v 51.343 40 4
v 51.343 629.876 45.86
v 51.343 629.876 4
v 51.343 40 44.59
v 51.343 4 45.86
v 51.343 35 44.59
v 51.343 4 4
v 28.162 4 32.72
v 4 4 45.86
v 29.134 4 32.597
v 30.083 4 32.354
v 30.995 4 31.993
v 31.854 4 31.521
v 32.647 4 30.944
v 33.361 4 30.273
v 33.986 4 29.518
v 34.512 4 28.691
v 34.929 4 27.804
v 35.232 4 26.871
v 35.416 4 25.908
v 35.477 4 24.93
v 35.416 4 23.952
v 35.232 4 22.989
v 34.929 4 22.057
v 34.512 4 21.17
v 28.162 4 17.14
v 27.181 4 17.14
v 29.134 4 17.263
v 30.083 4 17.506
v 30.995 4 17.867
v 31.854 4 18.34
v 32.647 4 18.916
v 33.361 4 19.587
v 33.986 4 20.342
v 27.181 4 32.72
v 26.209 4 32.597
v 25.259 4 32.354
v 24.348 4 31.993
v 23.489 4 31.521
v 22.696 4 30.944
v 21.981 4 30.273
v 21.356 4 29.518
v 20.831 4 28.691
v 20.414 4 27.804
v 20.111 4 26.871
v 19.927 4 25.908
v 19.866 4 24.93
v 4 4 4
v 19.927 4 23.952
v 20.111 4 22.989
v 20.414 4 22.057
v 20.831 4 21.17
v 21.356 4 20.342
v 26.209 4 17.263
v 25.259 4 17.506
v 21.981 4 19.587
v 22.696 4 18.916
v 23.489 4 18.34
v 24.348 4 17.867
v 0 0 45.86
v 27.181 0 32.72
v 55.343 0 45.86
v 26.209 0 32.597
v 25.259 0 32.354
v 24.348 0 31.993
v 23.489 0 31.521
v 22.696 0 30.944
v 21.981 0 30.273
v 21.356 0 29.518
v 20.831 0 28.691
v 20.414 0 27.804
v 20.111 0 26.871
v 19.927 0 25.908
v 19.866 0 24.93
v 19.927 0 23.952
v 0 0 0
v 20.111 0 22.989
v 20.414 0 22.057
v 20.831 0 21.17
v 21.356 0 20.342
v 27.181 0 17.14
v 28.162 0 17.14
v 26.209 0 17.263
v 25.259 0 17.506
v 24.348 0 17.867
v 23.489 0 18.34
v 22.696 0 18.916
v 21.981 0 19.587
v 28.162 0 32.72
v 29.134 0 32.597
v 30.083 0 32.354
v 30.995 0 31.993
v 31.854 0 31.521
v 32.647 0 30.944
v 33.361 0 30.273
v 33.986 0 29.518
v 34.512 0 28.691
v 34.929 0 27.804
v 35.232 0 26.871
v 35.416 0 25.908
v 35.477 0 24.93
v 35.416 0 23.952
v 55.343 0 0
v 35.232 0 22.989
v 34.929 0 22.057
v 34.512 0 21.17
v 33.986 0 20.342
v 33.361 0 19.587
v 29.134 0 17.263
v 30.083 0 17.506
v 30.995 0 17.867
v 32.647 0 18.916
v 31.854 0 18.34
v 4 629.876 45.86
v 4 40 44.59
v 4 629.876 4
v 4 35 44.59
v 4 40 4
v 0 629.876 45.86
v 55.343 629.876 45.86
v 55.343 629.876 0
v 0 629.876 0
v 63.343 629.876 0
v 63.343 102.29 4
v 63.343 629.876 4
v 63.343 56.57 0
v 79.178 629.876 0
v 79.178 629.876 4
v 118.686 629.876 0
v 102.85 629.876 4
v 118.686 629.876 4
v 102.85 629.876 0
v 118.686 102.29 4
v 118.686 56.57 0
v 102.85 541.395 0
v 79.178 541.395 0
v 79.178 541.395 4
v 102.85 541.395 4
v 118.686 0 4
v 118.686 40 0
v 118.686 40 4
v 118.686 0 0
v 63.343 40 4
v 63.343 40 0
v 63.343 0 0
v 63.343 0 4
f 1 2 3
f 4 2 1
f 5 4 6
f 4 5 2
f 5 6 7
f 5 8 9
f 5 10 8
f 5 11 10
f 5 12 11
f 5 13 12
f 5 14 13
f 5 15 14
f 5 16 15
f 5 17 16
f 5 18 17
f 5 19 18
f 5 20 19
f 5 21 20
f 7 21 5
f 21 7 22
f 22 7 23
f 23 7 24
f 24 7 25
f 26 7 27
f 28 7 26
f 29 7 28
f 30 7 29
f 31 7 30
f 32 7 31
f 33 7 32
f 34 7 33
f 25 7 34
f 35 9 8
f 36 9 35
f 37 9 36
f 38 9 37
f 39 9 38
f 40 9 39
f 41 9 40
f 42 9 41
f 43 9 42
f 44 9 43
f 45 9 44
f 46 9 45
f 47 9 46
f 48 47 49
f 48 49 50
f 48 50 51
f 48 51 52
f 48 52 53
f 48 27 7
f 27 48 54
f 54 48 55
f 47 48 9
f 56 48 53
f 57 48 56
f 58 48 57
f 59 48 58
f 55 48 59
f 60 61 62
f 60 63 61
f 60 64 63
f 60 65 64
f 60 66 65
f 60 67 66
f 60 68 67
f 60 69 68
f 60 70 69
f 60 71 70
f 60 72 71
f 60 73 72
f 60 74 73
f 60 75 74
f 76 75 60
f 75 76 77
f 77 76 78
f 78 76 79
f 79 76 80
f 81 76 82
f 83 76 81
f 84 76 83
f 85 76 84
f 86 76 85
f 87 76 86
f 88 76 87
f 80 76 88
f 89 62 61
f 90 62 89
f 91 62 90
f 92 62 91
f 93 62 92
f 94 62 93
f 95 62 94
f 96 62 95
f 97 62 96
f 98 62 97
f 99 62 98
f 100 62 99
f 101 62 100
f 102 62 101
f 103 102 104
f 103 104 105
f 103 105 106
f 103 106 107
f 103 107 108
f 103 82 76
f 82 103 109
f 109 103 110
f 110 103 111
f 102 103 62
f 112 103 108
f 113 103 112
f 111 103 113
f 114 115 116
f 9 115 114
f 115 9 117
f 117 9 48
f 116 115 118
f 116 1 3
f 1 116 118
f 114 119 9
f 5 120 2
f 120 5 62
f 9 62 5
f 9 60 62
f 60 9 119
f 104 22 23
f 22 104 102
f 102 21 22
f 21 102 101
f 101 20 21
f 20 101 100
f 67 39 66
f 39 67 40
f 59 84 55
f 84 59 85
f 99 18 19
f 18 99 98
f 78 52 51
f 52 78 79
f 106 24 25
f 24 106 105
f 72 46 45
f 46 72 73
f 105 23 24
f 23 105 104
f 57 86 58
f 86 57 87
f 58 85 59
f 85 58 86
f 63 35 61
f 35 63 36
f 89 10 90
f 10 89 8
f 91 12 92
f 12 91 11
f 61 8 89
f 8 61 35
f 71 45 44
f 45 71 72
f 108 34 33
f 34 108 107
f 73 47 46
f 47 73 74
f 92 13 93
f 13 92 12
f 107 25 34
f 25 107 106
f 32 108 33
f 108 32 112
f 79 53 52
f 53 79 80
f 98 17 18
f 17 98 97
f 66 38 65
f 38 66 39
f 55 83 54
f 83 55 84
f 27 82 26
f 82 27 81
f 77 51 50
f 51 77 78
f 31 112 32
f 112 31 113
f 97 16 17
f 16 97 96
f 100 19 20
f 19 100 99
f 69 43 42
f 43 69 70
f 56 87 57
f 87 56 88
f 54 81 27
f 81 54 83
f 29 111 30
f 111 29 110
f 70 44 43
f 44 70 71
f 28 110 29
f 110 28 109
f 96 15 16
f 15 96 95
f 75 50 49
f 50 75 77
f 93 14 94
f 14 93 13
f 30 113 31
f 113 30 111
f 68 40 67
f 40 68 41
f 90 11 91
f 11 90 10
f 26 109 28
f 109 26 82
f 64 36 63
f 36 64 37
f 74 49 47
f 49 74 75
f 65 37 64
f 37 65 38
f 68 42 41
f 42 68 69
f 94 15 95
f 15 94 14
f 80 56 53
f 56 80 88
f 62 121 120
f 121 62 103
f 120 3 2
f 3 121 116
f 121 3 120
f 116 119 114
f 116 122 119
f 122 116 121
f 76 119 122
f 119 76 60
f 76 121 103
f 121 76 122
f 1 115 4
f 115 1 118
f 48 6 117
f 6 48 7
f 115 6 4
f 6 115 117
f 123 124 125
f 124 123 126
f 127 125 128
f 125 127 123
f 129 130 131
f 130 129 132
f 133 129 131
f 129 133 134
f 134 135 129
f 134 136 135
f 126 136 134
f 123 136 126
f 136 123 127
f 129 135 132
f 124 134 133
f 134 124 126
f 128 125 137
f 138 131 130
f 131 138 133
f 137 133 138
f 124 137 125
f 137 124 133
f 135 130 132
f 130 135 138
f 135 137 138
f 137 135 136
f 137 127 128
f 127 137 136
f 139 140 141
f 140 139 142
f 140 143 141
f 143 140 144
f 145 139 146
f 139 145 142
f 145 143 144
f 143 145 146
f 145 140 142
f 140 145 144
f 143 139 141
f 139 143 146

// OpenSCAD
// The thickness of the material
thickness                = 4;

// The inner width (mouth width) of the pipe
width                    = 47.3428;

// The inner depth of the pipe
depth                    = 41.8602;

// The resonator length (you might want to add a few centimeters and increase the tuning slot length)
length                   = 589.8759;

// The thickness of the jet gap
jet_thickness            = 1.2702;

// The cutup height of the pipe (distance between jet and upper lip)
cutup_height             = 16.57;

// The angle of the upper labium (lip)
labium_angle             = 5;

// The initial thickness of the upper labium - can be required for 3D printing in some special cases. Otherwise set this to 0.
labium_initial_thickness = 0;

// The length of the foot of the pipe
foot_length              = 40;

// The diameter of the hole for the air supply
hole_diameter            = 15.6113;

// The length of the final piece of the jet
jet_length               = 5;

// If true, generate a stop for the pipe, if false, add a tuning slot
stopped_pipe             = false;

// The length of the tuning slot
tuning_slot_length       = length * 0.15;

// The width of the tuning slot
tuning_slot_width        = width * 0.5;

// The gap around the tuning stop
stop_gap                 = 1;

// The thickness of the tuning stop
stop_thickness           = 10;

// The length of the handle of the tuning stop
stop_handle_length       = 20;

// The diameter of the handle of the tuning stop
stop_handle_diameter     = width / 4;

// If true, place the pipe and its lid next to each other to allow for easier 3D printing
print_model              = true;

// ===== END OF PARAMETERS =====

module labial_pipe_lids(thickness,width,length,labium_angle,labium_initial_thickness,cutup_height,foot_length,stopped_pipe,tuning_slot_length,tuning_slot_width) {
    x_offset = width / 2 + thickness;
    lid_length = length - cutup_height;
    front_back_width = width + 2 * thickness;
    upper_lip_height = thickness / tan(labium_angle);
    
    // foot front
    translate([-x_offset,-thickness,-foot_length]) cube([front_back_width,thickness,foot_length]);
    
    // upper lip
    difference() {
        translate([0,0,cutup_height])
            rotate([90,-90,90])
                linear_extrude(height = front_back_width, center = true)
                    polygon([[0,0],[lid_length,0],[lid_length,thickness],[upper_lip_height,thickness],[0,labium_initial_thickness]]);
        if (!stopped_pipe) {
            translate([-tuning_slot_width/2,-1.5*thickness,length-tuning_slot_length]) cube([tuning_slot_width,2 * thickness,2*tuning_slot_length]);
        }
    }
}

module labial_pipe_stop(thickness,width,depth,length,stop_gap,stop_thickness,stop_handle_length,stop_handle_diameter) {
    stop_width = width - 2 * stop_gap;
    stop_depth = depth - 2 * stop_gap;
    translate([0,0,length - stop_thickness]) union () {
        translate([-stop_width/2,stop_gap,0]) cube([stop_width,stop_depth,stop_thickness]);
        translate([0,depth/2,stop_thickness]) cylinder(stop_handle_length * 0.9,d = stop_handle_diameter,$fn = 50);
        translate([0,depth/2,stop_thickness + stop_handle_length - stop_handle_diameter/2]) sphere(d = 1.3*stop_handle_diameter,$fn = 50);
    }
}

module labial_pipe(thickness,width,depth,length,jet_thickness,foot_length,hole_diameter,jet_length) {
    x_offset = width / 2 + thickness;
    total_length = foot_length + length;
    front_back_width = width + 2 * thickness;
    core_depth = depth - jet_thickness;
    core_length = foot_length - thickness;
    
    // right wall
    translate([x_offset - thickness,0,-foot_length]) cube([thickness,depth,total_length]);
    
    // left wall
    translate([-x_offset,0,-foot_length]) cube([thickness,depth,total_length]);
    
    // back wall
    translate([-x_offset,depth,-foot_length]) cube([front_back_width,thickness,total_length]);

    // foot underpart with hole
    difference() {
        translate([-x_offset+thickness,0,-foot_length]) cube([width,depth,thickness]);
        translate([0,depth/2,-foot_length+thickness/2]) cylinder(h = 1.2 * thickness, d = hole_diameter, center = true, $fn = 50);
    }
    
    // core
    translate([0,depth,-core_length]) rotate([90,-90,90]) linear_extrude(height = width, center = true) polygon([[0,0],[core_length,0],[core_length,core_depth],[core_length-jet_length,core_depth]]);
}

union() {
    if (print_model) {
        translate([width / 2 + thickness,foot_length,depth+thickness]) rotate([-90,0,0])
        labial_pipe(thickness,width,depth,length,jet_thickness,foot_length,hole_diameter,jet_length);
    } else {
        labial_pipe(thickness,width,depth,length,jet_thickness,foot_length,hole_diameter,jet_length);
    }
    
    if (print_model) {
        translate([width / 2 + width + 5 * thickness,foot_length,0]) rotate([-90,0,0])
        labial_pipe_lids(thickness,width,length,labium_angle,labium_initial_thickness,cutup_height,foot_length,stopped_pipe,tuning_slot_length,tuning_slot_width);
    } else {
        labial_pipe_lids(thickness,width,length,labium_angle,labium_initial_thickness,cutup_height,foot_length,stopped_pipe,tuning_slot_length,tuning_slot_width);
    }
    
    if (stopped_pipe) {
        if (print_model) {
            translate([width / 2 + 8 * thickness + 2 * width,0,-length+stop_thickness]) labial_pipe_stop(thickness,width,depth,length,stop_gap,stop_thickness,stop_handle_length,stop_handle_diameter);
        } else {
            labial_pipe_stop(thickness,width,depth,length,stop_gap,stop_thickness,stop_handle_length,stop_handle_diameter);
        }
    }
}
